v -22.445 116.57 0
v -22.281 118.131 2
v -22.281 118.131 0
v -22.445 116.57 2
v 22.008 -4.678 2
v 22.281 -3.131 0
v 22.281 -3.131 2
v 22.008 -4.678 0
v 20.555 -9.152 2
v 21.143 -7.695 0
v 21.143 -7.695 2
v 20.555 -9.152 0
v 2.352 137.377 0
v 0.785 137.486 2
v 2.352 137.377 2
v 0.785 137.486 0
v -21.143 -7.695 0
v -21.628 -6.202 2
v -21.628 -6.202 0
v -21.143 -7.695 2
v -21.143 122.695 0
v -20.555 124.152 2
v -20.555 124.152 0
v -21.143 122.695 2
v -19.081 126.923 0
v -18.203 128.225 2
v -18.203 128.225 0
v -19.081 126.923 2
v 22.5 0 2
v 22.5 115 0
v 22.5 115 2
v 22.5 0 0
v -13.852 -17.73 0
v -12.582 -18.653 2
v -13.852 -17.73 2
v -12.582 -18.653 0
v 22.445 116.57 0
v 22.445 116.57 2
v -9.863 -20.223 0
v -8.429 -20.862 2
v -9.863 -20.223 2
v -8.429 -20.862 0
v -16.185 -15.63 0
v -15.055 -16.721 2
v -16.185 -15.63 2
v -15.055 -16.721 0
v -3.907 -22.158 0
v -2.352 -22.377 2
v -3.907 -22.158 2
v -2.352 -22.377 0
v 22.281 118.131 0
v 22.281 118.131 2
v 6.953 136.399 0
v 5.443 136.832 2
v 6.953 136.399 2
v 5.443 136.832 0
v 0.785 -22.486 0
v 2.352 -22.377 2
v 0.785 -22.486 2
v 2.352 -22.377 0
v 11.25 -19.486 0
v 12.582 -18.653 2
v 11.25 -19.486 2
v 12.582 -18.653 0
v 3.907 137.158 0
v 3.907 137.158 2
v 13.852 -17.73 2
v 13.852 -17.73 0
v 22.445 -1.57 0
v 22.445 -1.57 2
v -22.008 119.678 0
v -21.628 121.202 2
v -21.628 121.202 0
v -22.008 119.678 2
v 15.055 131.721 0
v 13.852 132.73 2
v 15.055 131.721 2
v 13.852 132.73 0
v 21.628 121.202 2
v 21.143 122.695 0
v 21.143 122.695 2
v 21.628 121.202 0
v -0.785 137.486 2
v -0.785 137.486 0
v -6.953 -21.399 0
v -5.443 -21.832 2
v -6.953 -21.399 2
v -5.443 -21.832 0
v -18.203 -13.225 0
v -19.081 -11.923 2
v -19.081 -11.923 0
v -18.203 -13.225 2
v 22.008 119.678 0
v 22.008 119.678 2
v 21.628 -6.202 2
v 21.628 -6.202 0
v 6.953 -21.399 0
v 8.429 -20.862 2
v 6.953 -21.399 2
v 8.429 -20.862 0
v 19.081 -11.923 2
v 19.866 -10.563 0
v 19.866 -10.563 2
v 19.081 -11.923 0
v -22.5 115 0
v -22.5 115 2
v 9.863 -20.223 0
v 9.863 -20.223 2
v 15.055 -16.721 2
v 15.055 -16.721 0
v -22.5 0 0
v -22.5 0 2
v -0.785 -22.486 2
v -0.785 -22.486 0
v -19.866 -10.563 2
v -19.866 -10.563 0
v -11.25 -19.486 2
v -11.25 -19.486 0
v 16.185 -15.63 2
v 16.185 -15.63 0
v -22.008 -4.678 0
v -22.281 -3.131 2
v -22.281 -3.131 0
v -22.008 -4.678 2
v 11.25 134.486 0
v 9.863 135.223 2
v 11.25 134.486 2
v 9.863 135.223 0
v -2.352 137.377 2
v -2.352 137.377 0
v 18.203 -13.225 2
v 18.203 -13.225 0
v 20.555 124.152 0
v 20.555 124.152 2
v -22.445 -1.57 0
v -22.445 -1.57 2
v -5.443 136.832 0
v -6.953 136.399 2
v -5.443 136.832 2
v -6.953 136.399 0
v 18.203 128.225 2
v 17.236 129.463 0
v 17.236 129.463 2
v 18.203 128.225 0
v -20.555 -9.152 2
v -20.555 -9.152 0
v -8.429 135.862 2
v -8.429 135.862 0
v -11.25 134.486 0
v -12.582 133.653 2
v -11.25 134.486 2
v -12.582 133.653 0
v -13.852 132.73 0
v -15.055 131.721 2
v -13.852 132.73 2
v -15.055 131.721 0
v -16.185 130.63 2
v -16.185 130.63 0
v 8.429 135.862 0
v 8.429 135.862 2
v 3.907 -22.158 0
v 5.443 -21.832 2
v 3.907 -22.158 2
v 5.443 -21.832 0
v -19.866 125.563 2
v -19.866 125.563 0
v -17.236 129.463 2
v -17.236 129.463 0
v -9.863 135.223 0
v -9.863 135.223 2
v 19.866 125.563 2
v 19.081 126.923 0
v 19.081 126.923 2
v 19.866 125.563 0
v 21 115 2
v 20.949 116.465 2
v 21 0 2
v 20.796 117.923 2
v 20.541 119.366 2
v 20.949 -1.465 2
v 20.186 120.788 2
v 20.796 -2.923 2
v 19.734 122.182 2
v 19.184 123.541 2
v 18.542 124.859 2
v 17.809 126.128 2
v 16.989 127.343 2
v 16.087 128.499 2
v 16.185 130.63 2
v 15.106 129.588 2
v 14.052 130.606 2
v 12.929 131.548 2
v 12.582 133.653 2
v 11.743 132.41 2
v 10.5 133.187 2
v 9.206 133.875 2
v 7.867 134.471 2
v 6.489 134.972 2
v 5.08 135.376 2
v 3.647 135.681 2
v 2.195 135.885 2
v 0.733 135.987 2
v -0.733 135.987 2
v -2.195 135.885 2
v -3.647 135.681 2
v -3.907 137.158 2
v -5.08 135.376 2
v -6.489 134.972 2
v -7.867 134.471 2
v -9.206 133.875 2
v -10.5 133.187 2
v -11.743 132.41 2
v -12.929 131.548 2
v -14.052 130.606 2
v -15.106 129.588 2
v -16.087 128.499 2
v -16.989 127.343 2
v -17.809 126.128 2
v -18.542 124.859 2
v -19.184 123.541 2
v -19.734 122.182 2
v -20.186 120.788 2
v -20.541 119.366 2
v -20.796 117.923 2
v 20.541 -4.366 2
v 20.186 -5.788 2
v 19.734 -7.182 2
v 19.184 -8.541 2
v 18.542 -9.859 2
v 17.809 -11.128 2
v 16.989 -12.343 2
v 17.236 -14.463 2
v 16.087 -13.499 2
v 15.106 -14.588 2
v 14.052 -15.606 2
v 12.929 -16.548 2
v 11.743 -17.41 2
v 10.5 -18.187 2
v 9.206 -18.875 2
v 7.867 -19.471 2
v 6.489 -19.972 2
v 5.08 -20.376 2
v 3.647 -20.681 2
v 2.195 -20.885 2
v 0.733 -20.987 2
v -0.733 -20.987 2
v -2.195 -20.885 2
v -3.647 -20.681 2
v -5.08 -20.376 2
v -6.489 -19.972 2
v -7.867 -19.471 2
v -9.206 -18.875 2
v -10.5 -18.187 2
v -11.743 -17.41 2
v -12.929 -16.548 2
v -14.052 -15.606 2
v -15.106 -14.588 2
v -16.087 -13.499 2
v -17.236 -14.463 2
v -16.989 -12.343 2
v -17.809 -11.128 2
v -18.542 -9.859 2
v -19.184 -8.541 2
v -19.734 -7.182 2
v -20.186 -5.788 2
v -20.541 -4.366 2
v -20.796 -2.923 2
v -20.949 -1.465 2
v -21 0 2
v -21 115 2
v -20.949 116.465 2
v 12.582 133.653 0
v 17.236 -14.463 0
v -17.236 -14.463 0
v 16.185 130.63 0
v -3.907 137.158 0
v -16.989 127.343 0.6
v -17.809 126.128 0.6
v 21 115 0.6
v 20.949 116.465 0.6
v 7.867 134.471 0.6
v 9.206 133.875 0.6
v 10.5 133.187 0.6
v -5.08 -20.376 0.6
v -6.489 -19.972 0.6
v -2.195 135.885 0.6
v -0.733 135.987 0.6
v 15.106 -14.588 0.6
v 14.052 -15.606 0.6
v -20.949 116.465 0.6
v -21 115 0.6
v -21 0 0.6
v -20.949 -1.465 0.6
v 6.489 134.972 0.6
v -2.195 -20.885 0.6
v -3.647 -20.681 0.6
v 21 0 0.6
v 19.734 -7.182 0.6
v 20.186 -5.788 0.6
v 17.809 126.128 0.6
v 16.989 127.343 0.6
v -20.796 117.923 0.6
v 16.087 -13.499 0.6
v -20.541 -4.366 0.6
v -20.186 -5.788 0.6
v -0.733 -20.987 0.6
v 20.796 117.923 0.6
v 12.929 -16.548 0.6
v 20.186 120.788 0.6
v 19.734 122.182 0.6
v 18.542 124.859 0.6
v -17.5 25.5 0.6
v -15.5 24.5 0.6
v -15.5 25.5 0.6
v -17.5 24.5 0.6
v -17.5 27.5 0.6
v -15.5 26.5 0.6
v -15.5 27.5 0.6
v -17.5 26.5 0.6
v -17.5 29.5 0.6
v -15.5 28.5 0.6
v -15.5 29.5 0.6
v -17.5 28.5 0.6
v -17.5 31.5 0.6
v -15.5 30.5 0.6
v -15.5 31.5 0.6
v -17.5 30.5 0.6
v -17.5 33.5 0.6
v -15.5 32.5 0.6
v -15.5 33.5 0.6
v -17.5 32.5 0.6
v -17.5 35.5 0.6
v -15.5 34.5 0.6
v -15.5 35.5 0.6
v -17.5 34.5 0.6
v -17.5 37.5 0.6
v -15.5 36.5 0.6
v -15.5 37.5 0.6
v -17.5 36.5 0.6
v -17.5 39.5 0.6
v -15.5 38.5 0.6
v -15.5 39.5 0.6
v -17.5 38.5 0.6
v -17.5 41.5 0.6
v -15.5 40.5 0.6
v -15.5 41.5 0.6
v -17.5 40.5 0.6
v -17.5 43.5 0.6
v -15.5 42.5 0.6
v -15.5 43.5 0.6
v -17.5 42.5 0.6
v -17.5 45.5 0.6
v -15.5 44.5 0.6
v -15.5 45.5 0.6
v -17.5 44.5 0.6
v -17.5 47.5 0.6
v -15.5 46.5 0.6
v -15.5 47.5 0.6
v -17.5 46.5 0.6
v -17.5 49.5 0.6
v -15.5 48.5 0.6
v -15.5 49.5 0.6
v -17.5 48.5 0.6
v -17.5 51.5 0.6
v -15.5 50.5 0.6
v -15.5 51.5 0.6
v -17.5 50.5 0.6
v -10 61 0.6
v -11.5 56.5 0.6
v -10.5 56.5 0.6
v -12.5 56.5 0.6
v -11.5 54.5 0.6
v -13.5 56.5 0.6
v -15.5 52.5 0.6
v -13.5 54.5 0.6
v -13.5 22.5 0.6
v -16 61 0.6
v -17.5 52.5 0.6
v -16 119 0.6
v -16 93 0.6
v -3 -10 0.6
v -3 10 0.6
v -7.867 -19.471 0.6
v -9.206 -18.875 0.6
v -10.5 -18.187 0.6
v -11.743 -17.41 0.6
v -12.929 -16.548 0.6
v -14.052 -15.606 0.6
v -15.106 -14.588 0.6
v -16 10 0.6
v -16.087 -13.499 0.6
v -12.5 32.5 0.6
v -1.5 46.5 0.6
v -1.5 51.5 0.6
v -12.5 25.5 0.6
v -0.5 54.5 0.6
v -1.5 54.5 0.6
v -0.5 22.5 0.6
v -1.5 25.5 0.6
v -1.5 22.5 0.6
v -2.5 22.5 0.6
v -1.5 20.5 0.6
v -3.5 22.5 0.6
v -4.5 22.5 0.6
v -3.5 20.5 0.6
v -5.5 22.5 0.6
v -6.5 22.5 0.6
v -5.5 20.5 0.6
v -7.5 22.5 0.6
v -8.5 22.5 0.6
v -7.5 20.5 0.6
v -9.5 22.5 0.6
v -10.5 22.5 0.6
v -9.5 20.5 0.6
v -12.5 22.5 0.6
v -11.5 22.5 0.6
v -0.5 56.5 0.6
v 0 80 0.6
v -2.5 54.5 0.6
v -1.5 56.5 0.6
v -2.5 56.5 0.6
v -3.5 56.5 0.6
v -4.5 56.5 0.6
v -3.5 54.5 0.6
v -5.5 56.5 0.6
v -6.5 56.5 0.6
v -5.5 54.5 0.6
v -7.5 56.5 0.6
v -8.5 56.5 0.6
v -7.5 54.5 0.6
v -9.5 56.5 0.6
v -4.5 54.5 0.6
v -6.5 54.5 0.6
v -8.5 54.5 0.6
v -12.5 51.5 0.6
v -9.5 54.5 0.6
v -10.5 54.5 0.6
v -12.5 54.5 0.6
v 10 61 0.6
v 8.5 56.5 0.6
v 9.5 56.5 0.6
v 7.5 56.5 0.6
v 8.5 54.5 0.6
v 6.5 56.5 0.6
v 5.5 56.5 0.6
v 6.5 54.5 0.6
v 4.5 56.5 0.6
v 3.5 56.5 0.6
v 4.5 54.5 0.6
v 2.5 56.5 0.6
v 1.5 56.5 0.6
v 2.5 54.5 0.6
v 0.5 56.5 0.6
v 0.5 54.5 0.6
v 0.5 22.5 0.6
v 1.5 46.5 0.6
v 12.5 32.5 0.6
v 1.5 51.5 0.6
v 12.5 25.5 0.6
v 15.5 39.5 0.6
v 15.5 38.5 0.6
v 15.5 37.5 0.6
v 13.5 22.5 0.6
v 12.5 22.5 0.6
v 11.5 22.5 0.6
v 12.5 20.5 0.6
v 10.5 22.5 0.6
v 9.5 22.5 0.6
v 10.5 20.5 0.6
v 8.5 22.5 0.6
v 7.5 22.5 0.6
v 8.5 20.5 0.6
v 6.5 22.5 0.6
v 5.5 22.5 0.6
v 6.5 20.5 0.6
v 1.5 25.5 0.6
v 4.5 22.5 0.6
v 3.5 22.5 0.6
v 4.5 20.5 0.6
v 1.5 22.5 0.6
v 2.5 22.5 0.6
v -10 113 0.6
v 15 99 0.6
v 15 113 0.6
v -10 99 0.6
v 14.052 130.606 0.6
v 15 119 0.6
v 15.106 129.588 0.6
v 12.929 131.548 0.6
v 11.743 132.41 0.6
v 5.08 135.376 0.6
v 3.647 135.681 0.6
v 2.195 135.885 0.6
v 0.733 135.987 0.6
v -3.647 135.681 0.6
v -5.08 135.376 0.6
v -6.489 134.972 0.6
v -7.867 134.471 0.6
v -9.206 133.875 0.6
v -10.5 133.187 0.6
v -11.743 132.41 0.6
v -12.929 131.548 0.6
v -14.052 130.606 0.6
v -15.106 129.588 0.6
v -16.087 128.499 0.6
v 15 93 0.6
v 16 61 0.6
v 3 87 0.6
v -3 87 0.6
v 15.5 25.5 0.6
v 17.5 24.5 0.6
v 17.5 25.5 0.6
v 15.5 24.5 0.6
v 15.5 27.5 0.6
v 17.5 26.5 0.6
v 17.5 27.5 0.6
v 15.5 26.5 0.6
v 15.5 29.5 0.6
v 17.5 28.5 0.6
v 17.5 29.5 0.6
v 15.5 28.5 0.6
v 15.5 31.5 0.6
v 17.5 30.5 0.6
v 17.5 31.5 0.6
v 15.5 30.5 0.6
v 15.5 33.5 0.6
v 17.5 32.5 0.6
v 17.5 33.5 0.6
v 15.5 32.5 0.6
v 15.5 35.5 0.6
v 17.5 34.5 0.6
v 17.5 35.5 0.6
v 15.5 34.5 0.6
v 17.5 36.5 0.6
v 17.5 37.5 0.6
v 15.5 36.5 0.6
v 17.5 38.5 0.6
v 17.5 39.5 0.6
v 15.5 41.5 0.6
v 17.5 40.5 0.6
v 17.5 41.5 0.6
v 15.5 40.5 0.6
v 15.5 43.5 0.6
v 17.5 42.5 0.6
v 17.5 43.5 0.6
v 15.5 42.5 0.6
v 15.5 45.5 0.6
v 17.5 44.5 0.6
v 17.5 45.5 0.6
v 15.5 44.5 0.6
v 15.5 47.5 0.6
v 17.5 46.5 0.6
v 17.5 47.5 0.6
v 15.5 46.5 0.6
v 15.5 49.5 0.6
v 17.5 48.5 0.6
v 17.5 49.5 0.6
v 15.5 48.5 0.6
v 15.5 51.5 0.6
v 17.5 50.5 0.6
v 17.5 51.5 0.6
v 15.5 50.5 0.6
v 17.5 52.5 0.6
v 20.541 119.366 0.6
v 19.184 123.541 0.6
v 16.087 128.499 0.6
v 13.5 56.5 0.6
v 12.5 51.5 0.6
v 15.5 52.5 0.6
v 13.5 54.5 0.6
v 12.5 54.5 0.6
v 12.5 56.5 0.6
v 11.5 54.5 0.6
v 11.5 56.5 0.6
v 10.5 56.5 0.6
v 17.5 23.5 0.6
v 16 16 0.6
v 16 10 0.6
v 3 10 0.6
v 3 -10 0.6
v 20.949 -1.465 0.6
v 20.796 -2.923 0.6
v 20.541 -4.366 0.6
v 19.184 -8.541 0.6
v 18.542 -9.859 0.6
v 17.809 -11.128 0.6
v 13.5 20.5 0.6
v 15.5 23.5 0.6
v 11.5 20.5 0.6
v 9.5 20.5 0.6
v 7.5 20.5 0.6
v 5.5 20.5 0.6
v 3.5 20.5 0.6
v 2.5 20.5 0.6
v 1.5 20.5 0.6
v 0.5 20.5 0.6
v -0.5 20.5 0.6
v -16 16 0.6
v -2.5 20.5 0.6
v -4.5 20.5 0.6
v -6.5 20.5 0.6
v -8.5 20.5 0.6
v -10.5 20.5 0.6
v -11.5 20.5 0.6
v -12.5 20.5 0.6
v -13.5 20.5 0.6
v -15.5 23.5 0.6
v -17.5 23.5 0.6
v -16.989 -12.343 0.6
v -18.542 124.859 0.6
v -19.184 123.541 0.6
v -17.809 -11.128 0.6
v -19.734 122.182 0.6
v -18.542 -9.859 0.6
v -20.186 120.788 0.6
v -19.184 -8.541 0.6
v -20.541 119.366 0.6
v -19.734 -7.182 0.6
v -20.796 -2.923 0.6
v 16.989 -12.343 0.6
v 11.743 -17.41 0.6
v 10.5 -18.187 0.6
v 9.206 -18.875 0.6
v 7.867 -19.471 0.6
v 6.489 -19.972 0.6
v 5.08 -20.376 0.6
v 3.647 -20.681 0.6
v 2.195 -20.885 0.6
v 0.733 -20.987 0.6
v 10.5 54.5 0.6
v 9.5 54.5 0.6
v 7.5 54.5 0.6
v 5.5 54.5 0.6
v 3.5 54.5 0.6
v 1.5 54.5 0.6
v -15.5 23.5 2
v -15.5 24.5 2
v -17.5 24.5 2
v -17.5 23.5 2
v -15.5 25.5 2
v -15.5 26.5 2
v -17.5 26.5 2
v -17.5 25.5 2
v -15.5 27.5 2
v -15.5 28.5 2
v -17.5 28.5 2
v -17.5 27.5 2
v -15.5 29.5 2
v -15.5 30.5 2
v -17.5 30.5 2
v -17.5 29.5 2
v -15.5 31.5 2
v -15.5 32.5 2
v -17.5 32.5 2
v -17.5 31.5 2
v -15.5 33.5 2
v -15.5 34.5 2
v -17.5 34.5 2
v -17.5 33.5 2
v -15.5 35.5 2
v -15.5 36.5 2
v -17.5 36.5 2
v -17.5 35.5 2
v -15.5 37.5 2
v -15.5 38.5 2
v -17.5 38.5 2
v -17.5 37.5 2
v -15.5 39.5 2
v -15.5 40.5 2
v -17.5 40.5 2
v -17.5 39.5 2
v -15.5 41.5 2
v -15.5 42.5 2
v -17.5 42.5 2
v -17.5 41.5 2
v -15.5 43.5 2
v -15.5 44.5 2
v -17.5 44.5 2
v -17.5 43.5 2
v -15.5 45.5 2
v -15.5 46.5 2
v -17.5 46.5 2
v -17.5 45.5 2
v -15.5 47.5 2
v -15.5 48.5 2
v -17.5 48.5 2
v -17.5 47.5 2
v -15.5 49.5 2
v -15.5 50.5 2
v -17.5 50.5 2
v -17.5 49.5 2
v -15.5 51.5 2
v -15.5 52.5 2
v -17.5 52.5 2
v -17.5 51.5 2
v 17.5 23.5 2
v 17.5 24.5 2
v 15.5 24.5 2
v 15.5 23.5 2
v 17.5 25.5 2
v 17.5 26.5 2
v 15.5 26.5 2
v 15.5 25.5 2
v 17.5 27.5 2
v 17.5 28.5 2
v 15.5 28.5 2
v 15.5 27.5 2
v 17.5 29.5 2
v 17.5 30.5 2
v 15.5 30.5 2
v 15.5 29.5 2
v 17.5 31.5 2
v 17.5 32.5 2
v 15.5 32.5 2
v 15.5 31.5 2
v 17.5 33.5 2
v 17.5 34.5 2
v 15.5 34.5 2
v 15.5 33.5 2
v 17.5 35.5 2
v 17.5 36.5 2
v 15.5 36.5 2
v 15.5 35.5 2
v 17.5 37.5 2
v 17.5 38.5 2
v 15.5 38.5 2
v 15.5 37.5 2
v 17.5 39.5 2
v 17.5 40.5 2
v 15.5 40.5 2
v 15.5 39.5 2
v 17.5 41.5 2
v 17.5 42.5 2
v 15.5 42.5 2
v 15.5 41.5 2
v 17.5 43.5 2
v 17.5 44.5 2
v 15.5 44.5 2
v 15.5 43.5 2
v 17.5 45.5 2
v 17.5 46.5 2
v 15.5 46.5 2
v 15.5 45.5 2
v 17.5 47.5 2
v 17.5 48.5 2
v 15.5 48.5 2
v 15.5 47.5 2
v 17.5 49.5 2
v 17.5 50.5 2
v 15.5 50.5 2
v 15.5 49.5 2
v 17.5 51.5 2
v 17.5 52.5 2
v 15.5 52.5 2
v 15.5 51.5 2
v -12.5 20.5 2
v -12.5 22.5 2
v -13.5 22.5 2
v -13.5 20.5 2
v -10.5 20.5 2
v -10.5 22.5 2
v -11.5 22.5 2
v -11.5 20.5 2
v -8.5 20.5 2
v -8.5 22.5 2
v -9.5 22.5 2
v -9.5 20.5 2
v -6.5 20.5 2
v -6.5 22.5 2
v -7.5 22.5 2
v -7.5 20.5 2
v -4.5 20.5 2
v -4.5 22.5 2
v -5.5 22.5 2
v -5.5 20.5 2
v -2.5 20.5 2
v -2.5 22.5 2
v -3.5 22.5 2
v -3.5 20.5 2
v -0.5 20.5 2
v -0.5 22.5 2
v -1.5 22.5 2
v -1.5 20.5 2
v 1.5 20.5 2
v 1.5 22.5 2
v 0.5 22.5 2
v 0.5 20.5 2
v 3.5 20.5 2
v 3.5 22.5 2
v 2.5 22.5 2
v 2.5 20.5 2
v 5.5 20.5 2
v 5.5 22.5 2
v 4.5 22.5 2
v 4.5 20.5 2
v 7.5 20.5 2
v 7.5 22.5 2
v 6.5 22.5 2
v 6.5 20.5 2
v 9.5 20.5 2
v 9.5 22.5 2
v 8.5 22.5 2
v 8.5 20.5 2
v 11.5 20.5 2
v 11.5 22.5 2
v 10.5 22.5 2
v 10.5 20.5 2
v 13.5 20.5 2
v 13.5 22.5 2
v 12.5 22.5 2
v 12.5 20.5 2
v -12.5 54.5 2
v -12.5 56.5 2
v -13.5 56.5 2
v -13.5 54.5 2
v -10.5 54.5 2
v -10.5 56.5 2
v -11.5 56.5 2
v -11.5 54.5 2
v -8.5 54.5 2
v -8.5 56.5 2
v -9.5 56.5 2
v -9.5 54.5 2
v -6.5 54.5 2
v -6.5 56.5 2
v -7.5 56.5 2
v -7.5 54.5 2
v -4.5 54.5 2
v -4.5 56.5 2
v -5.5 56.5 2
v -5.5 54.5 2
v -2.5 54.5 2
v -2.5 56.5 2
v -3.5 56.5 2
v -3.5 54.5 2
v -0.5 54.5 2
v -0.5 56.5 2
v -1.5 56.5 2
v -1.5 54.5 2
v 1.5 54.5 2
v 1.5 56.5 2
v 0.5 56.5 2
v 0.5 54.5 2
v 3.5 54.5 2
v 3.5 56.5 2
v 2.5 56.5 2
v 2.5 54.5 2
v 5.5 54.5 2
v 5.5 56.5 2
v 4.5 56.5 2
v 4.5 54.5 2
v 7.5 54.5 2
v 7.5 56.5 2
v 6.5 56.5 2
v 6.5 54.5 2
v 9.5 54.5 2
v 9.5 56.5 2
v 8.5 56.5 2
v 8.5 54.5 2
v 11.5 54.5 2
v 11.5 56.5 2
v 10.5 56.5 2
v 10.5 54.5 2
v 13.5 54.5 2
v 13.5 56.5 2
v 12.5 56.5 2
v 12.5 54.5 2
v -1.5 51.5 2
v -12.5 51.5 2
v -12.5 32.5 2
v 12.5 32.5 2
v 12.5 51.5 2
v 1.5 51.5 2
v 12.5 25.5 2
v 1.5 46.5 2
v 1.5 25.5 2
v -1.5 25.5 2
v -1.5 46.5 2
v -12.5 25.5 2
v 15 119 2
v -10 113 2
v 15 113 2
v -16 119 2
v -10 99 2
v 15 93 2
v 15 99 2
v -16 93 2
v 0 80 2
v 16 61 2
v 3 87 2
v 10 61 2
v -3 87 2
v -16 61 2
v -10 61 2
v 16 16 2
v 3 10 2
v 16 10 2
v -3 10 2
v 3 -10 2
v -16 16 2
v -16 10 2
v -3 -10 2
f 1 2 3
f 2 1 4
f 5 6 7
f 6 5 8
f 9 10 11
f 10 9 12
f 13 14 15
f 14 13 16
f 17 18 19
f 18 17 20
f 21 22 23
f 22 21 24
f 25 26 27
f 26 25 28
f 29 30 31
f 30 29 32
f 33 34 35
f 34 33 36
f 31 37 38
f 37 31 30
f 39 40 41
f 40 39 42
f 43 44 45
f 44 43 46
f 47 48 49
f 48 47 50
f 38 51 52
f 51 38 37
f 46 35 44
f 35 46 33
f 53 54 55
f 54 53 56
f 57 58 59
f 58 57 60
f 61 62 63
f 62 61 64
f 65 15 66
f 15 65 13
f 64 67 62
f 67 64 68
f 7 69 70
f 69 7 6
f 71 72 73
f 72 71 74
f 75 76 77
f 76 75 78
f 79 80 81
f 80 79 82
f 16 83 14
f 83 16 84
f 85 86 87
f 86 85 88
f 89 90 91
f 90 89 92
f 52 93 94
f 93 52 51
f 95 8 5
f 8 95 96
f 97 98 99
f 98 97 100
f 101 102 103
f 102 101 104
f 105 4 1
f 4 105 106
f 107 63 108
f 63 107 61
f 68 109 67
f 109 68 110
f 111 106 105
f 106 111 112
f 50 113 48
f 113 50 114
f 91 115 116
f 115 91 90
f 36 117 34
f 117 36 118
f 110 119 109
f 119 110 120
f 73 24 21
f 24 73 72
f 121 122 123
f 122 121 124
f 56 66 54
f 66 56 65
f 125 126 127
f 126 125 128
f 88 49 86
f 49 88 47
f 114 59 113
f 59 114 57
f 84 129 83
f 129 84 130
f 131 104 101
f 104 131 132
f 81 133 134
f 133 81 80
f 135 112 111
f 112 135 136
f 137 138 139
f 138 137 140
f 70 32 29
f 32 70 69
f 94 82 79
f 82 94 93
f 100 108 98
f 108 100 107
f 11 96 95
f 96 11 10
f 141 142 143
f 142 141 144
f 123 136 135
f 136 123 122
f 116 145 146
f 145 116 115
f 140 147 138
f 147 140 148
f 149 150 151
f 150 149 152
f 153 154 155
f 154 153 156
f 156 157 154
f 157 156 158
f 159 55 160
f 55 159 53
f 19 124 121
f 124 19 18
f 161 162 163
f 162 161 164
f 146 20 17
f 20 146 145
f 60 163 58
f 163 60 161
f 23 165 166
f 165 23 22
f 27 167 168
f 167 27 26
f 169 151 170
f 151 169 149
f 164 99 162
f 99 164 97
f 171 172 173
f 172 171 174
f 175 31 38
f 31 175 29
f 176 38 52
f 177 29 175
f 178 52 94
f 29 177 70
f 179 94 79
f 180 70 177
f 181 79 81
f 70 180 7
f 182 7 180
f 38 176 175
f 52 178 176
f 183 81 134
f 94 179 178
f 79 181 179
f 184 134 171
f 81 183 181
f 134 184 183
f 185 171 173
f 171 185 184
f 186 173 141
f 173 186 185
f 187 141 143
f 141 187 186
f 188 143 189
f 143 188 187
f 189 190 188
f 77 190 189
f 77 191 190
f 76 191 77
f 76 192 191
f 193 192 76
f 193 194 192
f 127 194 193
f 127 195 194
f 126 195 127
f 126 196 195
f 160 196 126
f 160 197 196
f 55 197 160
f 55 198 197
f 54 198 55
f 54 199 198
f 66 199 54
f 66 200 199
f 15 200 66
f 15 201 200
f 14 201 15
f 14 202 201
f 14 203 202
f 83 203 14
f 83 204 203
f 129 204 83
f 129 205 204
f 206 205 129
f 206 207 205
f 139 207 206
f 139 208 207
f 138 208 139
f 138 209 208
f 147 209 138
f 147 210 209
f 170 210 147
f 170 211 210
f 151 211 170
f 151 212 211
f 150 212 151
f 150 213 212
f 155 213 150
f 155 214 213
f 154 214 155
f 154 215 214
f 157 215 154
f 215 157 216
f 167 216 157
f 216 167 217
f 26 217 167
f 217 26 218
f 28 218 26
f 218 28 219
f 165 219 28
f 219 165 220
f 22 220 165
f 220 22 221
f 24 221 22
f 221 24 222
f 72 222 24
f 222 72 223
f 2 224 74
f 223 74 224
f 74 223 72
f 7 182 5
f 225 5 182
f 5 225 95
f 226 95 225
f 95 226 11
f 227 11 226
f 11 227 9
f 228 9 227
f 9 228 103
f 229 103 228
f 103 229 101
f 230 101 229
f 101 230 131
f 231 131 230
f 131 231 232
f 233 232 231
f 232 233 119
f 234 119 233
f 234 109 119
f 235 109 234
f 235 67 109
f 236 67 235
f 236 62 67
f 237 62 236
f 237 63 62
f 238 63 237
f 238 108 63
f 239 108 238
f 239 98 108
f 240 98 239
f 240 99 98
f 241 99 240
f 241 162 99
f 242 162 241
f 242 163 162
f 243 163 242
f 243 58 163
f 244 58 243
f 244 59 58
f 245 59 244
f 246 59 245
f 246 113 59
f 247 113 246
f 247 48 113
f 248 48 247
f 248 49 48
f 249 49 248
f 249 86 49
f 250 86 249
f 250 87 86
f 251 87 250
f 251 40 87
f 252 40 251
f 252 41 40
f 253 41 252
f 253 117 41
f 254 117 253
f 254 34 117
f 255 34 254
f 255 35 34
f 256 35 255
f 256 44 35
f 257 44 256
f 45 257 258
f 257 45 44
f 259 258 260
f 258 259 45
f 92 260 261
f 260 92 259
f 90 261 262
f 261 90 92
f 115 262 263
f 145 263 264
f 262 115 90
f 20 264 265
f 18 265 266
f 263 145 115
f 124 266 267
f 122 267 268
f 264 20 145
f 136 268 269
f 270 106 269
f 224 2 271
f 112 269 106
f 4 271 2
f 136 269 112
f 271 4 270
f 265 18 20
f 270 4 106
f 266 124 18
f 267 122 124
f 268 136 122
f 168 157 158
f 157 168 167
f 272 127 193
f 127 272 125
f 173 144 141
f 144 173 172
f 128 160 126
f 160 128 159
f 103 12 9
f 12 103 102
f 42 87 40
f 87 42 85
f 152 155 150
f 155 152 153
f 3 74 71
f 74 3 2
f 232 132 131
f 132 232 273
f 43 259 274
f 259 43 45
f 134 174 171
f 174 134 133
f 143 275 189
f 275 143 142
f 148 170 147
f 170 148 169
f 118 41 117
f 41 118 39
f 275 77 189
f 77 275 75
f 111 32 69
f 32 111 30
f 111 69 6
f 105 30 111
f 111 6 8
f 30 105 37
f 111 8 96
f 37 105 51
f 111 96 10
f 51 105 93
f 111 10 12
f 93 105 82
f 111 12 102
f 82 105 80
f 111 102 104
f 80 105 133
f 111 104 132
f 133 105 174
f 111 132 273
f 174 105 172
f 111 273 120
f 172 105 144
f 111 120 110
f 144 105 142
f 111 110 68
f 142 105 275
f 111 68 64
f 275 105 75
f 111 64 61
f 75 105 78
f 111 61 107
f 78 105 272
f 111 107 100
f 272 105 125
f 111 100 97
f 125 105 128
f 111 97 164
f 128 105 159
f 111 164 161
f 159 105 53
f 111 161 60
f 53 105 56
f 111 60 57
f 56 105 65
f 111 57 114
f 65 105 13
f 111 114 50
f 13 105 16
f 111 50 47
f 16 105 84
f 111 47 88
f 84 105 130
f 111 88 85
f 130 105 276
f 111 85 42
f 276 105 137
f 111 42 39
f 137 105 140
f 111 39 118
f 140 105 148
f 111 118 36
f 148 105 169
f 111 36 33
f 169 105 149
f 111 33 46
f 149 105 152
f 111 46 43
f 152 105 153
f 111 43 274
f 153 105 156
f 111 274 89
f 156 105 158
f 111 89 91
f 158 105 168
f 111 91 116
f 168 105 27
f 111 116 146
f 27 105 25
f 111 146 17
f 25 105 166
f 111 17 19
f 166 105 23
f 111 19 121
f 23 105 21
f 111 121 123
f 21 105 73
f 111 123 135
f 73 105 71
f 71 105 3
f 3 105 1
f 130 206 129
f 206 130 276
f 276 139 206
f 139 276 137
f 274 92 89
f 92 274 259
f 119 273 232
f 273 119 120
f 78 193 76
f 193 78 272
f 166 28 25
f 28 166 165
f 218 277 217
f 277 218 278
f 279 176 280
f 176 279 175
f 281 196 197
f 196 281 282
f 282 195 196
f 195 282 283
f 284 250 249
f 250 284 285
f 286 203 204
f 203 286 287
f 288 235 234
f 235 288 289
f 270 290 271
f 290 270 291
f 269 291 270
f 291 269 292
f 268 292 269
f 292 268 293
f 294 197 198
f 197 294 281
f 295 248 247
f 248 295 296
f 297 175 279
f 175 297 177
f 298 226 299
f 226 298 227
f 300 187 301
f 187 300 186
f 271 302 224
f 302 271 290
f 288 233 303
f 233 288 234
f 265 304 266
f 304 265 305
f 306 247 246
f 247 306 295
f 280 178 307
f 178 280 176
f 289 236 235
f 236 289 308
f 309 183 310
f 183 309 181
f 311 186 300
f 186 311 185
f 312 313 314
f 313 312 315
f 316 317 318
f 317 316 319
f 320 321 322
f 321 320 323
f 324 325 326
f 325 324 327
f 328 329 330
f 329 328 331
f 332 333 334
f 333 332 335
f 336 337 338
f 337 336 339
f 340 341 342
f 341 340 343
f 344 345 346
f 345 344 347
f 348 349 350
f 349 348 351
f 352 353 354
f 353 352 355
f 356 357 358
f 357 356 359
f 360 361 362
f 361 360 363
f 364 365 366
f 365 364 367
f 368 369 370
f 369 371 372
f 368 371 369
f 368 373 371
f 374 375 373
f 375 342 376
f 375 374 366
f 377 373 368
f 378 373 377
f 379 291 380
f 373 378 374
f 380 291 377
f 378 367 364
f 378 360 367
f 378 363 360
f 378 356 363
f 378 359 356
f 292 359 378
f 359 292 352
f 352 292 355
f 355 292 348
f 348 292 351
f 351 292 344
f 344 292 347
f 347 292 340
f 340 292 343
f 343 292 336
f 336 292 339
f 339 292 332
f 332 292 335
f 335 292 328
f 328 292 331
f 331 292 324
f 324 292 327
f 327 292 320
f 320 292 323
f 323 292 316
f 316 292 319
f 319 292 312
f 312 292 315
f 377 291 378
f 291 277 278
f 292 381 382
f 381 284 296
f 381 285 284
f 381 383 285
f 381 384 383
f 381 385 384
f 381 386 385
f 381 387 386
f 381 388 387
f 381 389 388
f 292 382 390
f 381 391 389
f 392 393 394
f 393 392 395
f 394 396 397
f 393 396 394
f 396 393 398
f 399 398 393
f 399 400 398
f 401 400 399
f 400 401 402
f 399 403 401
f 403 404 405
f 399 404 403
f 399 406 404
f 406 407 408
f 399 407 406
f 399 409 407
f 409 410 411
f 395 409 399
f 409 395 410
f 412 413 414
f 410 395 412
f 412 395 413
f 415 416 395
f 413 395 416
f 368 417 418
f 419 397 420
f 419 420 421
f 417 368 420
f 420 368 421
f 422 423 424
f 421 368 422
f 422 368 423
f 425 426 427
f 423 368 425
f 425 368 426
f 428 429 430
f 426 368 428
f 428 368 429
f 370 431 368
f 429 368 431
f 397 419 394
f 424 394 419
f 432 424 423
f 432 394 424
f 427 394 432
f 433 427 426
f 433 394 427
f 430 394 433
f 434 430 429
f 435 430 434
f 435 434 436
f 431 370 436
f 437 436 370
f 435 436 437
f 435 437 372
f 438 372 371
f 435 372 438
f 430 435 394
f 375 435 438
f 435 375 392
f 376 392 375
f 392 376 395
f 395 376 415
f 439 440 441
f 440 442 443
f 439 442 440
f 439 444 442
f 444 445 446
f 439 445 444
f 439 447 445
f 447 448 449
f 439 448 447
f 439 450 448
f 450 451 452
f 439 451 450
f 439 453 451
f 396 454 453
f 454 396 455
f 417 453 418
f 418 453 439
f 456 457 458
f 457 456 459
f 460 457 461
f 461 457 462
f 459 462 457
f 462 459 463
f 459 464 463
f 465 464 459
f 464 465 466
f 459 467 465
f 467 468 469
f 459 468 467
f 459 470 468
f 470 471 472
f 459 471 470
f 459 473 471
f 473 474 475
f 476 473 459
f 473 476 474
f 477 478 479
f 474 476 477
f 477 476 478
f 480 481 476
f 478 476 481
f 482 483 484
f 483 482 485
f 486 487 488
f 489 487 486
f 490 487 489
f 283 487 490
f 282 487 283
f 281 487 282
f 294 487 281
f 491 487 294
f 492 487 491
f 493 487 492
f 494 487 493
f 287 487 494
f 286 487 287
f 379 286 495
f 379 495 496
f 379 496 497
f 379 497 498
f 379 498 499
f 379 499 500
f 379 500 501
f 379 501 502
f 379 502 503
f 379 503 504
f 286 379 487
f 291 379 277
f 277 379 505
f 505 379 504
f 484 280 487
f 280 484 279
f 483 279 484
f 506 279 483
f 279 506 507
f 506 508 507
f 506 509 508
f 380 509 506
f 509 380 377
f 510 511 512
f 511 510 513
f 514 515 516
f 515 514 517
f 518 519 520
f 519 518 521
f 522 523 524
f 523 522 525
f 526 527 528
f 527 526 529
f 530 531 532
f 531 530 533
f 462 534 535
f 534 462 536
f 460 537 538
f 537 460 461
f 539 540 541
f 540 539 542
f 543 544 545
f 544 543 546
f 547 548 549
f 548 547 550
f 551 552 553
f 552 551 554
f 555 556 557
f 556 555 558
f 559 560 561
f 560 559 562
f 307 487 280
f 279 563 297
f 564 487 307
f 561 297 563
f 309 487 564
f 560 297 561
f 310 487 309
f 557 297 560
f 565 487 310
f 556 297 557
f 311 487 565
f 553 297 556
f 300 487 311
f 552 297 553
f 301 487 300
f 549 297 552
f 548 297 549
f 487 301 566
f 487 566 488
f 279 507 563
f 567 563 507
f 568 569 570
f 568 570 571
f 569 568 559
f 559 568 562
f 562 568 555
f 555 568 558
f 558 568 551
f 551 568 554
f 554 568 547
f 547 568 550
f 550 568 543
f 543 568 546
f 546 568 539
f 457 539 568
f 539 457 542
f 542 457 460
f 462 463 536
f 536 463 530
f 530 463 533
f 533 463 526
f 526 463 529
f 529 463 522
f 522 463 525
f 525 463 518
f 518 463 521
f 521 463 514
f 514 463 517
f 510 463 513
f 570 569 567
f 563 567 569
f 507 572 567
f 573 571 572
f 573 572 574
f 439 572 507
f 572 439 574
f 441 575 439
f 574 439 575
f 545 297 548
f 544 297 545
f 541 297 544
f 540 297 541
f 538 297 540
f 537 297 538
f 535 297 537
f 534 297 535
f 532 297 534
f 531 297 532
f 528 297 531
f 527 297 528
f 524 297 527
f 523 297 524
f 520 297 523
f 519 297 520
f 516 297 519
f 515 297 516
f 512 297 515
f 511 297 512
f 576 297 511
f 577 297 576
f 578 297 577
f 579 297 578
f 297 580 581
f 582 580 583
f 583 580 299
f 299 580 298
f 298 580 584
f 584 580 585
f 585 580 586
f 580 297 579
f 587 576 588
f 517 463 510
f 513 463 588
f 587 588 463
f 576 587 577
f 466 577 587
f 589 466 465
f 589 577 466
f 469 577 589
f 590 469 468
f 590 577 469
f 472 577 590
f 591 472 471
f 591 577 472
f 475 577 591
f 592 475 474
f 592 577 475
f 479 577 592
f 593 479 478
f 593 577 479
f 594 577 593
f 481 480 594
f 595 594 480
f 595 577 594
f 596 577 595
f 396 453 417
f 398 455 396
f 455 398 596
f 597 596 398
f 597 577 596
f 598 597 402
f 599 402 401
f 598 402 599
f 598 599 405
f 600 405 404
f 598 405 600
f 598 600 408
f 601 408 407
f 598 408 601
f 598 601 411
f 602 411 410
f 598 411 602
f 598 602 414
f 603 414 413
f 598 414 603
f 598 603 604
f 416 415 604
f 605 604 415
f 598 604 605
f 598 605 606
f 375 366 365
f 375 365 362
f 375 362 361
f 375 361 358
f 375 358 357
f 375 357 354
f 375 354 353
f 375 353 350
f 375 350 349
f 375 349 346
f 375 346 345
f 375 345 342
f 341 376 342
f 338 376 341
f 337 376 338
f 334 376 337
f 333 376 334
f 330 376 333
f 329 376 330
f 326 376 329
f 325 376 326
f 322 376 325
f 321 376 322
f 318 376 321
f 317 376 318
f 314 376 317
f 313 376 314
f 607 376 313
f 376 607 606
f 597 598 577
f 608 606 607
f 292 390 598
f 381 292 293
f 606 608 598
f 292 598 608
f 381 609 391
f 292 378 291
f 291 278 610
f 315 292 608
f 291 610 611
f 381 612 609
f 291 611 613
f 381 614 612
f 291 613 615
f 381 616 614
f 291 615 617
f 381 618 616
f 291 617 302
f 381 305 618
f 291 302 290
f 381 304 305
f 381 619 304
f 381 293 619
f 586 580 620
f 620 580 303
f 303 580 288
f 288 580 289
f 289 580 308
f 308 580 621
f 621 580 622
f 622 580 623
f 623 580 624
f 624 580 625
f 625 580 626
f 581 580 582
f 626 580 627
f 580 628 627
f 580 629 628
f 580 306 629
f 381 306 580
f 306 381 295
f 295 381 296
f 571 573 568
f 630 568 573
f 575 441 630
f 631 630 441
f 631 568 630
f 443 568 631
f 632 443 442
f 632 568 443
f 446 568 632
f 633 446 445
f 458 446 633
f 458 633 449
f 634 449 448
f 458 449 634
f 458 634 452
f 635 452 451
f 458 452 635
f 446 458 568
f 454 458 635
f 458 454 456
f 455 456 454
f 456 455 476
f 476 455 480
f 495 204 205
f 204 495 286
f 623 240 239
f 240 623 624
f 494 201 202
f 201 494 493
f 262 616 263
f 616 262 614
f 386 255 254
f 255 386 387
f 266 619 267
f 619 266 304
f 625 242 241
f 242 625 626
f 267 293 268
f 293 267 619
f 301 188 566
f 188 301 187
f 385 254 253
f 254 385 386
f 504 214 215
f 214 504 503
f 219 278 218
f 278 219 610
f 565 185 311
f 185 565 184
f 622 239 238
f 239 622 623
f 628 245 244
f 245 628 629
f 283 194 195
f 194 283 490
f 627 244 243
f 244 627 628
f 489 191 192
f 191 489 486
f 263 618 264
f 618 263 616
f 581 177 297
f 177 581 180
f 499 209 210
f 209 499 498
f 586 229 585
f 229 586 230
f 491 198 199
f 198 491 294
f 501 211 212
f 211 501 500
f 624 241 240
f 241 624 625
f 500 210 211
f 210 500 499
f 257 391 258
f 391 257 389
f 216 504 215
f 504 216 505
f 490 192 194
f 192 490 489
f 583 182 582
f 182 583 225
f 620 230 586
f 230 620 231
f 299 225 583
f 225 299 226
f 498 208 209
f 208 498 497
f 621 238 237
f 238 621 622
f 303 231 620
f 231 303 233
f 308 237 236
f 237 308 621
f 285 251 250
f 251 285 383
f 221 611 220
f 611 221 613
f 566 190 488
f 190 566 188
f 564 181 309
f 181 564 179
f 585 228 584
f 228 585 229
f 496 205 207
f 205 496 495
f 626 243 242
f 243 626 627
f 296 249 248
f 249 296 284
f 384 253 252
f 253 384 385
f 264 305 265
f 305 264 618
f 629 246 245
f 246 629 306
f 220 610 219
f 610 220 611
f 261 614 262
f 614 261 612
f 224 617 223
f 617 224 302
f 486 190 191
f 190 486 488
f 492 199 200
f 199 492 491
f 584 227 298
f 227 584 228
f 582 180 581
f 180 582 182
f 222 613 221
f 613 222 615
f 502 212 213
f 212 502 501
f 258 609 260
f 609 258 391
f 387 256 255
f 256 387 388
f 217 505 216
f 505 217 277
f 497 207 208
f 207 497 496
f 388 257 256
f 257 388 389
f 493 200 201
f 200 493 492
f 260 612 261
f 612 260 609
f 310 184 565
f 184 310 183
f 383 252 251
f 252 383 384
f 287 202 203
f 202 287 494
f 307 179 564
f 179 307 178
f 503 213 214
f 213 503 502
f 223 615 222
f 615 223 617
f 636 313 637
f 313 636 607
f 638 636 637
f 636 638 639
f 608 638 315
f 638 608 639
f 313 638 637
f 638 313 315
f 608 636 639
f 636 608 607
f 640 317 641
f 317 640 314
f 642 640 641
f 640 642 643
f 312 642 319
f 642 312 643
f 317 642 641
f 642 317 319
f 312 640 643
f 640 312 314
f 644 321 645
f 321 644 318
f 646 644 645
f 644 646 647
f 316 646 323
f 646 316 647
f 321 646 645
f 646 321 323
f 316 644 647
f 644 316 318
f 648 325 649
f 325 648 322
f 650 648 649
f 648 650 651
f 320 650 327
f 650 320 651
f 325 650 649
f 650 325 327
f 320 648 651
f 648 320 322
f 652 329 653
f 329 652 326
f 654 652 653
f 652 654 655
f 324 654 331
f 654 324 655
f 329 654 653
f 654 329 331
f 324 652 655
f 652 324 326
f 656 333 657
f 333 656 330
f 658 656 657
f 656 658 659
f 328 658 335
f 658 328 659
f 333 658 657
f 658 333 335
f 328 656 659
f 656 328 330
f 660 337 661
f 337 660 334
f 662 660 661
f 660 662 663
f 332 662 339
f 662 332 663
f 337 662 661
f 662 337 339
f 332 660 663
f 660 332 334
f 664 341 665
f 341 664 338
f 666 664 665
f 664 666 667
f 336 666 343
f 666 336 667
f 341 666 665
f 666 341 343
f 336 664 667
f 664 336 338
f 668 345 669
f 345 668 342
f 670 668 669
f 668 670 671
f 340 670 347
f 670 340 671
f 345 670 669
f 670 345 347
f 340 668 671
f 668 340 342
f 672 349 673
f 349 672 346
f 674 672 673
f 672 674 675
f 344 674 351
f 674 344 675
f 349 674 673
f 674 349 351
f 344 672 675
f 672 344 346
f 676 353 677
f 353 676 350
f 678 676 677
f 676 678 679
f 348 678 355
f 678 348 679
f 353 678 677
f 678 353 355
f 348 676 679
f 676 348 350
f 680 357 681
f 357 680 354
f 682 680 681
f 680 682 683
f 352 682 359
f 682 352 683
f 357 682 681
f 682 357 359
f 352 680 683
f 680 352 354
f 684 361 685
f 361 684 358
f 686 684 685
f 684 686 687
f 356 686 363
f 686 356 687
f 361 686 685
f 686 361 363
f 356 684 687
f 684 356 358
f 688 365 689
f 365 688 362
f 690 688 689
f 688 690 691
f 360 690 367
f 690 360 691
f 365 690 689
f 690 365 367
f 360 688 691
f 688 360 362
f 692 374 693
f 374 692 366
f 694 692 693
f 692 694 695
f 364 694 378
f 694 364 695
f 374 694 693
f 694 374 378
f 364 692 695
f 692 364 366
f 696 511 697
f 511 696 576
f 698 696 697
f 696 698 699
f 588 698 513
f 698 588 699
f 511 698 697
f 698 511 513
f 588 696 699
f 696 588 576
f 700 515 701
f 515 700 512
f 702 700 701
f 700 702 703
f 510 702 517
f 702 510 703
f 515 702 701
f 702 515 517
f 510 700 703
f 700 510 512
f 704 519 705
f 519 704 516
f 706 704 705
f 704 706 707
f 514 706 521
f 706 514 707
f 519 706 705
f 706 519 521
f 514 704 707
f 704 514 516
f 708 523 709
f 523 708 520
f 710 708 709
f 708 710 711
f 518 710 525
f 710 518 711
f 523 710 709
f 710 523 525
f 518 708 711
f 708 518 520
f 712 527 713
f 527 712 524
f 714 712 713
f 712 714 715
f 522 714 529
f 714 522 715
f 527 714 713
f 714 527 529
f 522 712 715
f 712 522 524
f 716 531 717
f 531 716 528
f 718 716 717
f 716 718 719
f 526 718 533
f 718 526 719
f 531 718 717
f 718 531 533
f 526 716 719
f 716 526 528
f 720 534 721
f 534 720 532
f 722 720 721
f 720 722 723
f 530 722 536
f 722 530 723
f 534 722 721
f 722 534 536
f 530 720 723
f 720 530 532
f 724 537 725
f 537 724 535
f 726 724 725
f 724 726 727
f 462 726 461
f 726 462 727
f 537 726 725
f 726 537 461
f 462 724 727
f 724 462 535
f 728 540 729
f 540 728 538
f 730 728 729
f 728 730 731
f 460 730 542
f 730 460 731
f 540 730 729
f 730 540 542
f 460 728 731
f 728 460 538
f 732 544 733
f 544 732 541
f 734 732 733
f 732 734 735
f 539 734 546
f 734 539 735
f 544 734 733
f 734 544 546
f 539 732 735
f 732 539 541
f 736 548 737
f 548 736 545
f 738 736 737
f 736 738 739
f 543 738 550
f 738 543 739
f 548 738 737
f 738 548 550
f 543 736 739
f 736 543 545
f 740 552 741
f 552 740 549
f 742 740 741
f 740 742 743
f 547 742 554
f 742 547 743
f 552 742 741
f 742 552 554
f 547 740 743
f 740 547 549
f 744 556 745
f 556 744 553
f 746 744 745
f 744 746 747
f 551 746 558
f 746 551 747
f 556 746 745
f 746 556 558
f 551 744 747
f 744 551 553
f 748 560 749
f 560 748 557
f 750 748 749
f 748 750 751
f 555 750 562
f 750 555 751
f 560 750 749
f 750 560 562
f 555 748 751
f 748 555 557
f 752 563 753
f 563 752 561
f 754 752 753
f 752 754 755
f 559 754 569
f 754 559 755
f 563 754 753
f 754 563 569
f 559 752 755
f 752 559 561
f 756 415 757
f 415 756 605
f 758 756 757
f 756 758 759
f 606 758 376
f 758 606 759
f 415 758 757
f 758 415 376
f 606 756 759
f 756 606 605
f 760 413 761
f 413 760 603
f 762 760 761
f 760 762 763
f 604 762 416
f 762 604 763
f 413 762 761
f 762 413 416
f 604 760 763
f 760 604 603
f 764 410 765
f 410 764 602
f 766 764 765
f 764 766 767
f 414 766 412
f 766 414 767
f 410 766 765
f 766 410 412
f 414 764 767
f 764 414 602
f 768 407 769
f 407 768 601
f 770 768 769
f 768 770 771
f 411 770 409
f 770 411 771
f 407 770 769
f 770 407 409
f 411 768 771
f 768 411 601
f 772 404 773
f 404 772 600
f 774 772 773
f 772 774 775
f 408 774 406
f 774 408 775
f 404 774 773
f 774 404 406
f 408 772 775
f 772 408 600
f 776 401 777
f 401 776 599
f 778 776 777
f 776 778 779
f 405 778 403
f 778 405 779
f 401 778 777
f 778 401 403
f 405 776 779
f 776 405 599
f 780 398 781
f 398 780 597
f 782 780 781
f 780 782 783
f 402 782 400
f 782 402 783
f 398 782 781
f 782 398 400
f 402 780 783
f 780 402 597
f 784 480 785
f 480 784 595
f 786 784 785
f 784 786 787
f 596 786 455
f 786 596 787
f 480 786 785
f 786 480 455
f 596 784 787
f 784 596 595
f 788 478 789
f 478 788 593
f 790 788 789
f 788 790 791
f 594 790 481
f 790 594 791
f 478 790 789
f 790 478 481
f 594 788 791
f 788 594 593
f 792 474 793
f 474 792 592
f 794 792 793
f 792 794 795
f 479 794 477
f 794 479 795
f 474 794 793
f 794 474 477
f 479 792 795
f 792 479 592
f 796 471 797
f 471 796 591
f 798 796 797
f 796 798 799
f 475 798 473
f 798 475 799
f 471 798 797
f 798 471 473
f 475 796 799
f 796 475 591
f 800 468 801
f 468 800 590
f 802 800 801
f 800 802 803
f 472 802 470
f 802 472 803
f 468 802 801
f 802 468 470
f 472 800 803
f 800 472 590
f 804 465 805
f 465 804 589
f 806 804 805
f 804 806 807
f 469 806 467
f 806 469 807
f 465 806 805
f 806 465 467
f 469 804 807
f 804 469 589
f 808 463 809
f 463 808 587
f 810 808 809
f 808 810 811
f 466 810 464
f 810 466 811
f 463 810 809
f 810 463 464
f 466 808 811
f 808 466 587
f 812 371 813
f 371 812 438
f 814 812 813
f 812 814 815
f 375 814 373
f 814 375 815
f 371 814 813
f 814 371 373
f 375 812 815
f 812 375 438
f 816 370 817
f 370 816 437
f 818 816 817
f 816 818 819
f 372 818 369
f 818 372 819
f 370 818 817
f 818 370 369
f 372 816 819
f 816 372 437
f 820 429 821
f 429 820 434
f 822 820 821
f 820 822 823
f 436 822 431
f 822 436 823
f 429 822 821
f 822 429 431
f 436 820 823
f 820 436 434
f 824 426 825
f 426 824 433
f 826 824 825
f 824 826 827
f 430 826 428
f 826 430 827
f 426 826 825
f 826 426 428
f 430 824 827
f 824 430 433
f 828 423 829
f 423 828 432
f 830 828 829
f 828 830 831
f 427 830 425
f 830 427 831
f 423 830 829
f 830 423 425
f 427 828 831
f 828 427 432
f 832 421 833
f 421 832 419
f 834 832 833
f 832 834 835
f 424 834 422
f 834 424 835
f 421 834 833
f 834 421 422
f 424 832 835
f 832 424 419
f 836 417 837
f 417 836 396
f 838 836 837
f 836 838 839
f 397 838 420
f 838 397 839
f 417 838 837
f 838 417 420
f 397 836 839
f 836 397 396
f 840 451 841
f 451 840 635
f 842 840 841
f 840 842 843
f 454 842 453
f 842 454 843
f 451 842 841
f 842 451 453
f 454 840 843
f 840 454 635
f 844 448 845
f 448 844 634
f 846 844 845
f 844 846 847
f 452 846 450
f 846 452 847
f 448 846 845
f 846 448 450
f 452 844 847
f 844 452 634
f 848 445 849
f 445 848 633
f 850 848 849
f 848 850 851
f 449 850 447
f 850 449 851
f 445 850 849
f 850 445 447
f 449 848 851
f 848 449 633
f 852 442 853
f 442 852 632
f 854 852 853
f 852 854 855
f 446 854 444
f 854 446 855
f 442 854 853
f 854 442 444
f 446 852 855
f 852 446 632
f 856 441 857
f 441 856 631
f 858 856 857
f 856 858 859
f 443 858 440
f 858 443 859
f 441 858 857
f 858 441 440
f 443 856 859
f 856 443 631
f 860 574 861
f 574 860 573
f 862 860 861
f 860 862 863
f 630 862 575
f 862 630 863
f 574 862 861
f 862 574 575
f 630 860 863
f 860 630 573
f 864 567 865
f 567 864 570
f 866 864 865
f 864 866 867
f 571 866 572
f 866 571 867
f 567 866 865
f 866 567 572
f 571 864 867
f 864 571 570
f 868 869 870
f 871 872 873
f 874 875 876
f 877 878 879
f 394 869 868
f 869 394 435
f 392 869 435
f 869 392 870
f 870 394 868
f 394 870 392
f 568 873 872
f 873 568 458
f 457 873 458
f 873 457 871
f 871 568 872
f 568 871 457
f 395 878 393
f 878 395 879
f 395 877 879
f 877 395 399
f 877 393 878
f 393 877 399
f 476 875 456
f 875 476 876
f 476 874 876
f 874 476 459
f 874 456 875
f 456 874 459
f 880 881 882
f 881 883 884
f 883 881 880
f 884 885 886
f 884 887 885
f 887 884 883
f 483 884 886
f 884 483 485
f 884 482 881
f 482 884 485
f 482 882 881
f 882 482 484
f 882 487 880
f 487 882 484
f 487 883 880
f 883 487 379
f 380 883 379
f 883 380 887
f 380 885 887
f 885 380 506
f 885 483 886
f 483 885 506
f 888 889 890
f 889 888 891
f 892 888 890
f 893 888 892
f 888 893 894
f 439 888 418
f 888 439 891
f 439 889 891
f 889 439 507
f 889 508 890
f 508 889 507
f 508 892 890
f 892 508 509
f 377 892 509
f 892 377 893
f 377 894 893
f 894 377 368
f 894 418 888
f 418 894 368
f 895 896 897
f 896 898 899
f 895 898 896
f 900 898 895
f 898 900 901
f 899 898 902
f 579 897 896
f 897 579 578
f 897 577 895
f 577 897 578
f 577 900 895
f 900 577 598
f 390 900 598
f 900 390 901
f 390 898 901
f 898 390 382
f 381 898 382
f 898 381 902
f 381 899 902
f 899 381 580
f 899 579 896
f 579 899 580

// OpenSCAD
$fn = 90;
height = 2;

module s()
{
    linear_extrude(height = height, center = false, convexity = 10, twist = 0)
    {
        polygon(points = [[0,0],[31,0],[31,6],[6,6],[6,20],[31,20],[31,26],[0,26]]);
    }
}

module l()
{
    linear_extrude(height = height, center = false, convexity = 10, twist = 0)
    {
        polygon(points = [[0,0],[6,0],[16,19],[26,0],[32,0],[19,26],[13,26]]);
    }
}

module o()
{
    linear_extrude(height = height, center = false, convexity = 10, twist = 0)
    {
        polygon(points = [[5,0],[16,0],[16,21]]);
        polygon(points = [[19,0],[30,0],[19,21]]);
        polygon(points = [[5,7],[16,26],[5,26]]);
        polygon(points = [[19,26],[30,26],[30,7]]);
    }
    for(i=[-2:2:26])
    {
        translate([0,i,0])
            cube([2,1,height]);
    }
    for(i=[-2:2:26])
    {
        translate([33,i,0])
            cube([2,1,height]);
    }
    for(i=[4:2:30])
    {
        translate([i,-5,0])
            cube([1,2,height]);
    }
    for(i=[4:2:30])
    {
        translate([i,29,0])
            cube([1,2,height]);
    }
}
module t()
{
    linear_extrude(height = height, center = false, convexity = 10, twist = 0)
    {
        polygon(points = [[13,0],[19,0],[19,20],[32,20],[32,26],[0,26],[0,20],[13,20]]);
    }
}


module ktn()
{
    difference()
    {
        union()
        {
            hull()
            {
                translate([13,14,0])
                    cylinder(d=3,h=height);
                translate([13,-14,0])
                    cylinder(d=3,h=height);
                translate([5,-4,0])
                    cylinder(d=3,h=height);
                translate([5,4,0])
                    cylinder(d=3,h=height);
            }
            hull()
            {
                translate([0,4,0])
                    cylinder(d=3,h=height);
                translate([0,-4,0])
                    cylinder(d=3,h=height);
                translate([4,-4,0])
                    cylinder(d=3,h=height);
                translate([4,4,0])
                    cylinder(d=3,h=height);
            }
        }
        union()
        {
            hull()
            {
                translate([0,4,0])
                    cylinder(d=1,h=height);
                translate([0,-4,0])
                    cylinder(d=1,h=height);
                translate([4,-4,0])
                    cylinder(d=1,h=height);
                translate([4,4,0])
                    cylinder(d=1,h=height);
            }
            hull()
            {
                translate([13,14,0])
                    cylinder(d=1,h=height);
                translate([13,-14,0])
                    cylinder(d=1,h=height);
                translate([6,-4,0])
                    cylinder(d=1,h=height);
                translate([6,4,0])
                    cylinder(d=1,h=height);
            }
        }
    }
    intersection()
    {
        union()
        {
            difference()
            {
                translate([16,0,0])
                    cylinder(d=10,h=height);
                translate([16,0,0])
                    cylinder(d=8,h=height);
            }
            difference()
            {
                translate([16,0,0])
                    cylinder(d=19,h=height);
                translate([16,0,0])
                    cylinder(d=17,h=height);
            }
            difference()
            {
                translate([16,0,0])
                    cylinder(d=28,h=height);
                translate([16,0,0])
                    cylinder(d=26,h=height);
            }
        }
        translate([33,0,0])
            rotate([0,0,45])
                cube([30,30,30],center=true);
    }
}

module v1()
{
    difference()
    {
        union()
        {
            hull()
            {
                translate([0,150,0])
                    cylinder(d=80,h=height,center=false);
                translate([0,10,0])
                    cylinder(d=80,h=height,center=false);
            }
        }
        union()
        {
            hull()
            {
                translate([0,150,0.6])
                    cylinder(d=76,h=height,center=false);
                translate([0,10,0.6])
                    cylinder(d=76,h=height,center=false);
            }
        }
    }
    translate([0,150,0])
    {
        translate([4,0,0])
            ktn();
        mirror([1,0,0])
            translate([4,0,0])
                ktn();
    }
    translate([-16,93,0])
        s();
    translate([-16,61,0])
        l();
    translate([-17.5,25.5,0])
        o();
    translate([-16,-10,0])
        t();
}

module v2()
{
    difference()
    {
        union()
        {
            hull()
            {
                translate([0,115,0])
                    cylinder(d=45,h=height,center=false);
                translate([0,0,0])
                    cylinder(d=45,h=height,center=false);
            }
        }
        union()
        {
            hull()
            {
                translate([0,115,0.6])
                    cylinder(d=42,h=height,center=false);
                translate([0,0,0.6])
                    cylinder(d=42,h=height,center=false);
            }
        }
    }
    translate([-16,93,0])
        s();
    translate([-16,61,0])
        l();
    translate([-17.5,25.5,0])
        o();
    translate([-16,-10,0])
        t();
}

//v1();
v2();
